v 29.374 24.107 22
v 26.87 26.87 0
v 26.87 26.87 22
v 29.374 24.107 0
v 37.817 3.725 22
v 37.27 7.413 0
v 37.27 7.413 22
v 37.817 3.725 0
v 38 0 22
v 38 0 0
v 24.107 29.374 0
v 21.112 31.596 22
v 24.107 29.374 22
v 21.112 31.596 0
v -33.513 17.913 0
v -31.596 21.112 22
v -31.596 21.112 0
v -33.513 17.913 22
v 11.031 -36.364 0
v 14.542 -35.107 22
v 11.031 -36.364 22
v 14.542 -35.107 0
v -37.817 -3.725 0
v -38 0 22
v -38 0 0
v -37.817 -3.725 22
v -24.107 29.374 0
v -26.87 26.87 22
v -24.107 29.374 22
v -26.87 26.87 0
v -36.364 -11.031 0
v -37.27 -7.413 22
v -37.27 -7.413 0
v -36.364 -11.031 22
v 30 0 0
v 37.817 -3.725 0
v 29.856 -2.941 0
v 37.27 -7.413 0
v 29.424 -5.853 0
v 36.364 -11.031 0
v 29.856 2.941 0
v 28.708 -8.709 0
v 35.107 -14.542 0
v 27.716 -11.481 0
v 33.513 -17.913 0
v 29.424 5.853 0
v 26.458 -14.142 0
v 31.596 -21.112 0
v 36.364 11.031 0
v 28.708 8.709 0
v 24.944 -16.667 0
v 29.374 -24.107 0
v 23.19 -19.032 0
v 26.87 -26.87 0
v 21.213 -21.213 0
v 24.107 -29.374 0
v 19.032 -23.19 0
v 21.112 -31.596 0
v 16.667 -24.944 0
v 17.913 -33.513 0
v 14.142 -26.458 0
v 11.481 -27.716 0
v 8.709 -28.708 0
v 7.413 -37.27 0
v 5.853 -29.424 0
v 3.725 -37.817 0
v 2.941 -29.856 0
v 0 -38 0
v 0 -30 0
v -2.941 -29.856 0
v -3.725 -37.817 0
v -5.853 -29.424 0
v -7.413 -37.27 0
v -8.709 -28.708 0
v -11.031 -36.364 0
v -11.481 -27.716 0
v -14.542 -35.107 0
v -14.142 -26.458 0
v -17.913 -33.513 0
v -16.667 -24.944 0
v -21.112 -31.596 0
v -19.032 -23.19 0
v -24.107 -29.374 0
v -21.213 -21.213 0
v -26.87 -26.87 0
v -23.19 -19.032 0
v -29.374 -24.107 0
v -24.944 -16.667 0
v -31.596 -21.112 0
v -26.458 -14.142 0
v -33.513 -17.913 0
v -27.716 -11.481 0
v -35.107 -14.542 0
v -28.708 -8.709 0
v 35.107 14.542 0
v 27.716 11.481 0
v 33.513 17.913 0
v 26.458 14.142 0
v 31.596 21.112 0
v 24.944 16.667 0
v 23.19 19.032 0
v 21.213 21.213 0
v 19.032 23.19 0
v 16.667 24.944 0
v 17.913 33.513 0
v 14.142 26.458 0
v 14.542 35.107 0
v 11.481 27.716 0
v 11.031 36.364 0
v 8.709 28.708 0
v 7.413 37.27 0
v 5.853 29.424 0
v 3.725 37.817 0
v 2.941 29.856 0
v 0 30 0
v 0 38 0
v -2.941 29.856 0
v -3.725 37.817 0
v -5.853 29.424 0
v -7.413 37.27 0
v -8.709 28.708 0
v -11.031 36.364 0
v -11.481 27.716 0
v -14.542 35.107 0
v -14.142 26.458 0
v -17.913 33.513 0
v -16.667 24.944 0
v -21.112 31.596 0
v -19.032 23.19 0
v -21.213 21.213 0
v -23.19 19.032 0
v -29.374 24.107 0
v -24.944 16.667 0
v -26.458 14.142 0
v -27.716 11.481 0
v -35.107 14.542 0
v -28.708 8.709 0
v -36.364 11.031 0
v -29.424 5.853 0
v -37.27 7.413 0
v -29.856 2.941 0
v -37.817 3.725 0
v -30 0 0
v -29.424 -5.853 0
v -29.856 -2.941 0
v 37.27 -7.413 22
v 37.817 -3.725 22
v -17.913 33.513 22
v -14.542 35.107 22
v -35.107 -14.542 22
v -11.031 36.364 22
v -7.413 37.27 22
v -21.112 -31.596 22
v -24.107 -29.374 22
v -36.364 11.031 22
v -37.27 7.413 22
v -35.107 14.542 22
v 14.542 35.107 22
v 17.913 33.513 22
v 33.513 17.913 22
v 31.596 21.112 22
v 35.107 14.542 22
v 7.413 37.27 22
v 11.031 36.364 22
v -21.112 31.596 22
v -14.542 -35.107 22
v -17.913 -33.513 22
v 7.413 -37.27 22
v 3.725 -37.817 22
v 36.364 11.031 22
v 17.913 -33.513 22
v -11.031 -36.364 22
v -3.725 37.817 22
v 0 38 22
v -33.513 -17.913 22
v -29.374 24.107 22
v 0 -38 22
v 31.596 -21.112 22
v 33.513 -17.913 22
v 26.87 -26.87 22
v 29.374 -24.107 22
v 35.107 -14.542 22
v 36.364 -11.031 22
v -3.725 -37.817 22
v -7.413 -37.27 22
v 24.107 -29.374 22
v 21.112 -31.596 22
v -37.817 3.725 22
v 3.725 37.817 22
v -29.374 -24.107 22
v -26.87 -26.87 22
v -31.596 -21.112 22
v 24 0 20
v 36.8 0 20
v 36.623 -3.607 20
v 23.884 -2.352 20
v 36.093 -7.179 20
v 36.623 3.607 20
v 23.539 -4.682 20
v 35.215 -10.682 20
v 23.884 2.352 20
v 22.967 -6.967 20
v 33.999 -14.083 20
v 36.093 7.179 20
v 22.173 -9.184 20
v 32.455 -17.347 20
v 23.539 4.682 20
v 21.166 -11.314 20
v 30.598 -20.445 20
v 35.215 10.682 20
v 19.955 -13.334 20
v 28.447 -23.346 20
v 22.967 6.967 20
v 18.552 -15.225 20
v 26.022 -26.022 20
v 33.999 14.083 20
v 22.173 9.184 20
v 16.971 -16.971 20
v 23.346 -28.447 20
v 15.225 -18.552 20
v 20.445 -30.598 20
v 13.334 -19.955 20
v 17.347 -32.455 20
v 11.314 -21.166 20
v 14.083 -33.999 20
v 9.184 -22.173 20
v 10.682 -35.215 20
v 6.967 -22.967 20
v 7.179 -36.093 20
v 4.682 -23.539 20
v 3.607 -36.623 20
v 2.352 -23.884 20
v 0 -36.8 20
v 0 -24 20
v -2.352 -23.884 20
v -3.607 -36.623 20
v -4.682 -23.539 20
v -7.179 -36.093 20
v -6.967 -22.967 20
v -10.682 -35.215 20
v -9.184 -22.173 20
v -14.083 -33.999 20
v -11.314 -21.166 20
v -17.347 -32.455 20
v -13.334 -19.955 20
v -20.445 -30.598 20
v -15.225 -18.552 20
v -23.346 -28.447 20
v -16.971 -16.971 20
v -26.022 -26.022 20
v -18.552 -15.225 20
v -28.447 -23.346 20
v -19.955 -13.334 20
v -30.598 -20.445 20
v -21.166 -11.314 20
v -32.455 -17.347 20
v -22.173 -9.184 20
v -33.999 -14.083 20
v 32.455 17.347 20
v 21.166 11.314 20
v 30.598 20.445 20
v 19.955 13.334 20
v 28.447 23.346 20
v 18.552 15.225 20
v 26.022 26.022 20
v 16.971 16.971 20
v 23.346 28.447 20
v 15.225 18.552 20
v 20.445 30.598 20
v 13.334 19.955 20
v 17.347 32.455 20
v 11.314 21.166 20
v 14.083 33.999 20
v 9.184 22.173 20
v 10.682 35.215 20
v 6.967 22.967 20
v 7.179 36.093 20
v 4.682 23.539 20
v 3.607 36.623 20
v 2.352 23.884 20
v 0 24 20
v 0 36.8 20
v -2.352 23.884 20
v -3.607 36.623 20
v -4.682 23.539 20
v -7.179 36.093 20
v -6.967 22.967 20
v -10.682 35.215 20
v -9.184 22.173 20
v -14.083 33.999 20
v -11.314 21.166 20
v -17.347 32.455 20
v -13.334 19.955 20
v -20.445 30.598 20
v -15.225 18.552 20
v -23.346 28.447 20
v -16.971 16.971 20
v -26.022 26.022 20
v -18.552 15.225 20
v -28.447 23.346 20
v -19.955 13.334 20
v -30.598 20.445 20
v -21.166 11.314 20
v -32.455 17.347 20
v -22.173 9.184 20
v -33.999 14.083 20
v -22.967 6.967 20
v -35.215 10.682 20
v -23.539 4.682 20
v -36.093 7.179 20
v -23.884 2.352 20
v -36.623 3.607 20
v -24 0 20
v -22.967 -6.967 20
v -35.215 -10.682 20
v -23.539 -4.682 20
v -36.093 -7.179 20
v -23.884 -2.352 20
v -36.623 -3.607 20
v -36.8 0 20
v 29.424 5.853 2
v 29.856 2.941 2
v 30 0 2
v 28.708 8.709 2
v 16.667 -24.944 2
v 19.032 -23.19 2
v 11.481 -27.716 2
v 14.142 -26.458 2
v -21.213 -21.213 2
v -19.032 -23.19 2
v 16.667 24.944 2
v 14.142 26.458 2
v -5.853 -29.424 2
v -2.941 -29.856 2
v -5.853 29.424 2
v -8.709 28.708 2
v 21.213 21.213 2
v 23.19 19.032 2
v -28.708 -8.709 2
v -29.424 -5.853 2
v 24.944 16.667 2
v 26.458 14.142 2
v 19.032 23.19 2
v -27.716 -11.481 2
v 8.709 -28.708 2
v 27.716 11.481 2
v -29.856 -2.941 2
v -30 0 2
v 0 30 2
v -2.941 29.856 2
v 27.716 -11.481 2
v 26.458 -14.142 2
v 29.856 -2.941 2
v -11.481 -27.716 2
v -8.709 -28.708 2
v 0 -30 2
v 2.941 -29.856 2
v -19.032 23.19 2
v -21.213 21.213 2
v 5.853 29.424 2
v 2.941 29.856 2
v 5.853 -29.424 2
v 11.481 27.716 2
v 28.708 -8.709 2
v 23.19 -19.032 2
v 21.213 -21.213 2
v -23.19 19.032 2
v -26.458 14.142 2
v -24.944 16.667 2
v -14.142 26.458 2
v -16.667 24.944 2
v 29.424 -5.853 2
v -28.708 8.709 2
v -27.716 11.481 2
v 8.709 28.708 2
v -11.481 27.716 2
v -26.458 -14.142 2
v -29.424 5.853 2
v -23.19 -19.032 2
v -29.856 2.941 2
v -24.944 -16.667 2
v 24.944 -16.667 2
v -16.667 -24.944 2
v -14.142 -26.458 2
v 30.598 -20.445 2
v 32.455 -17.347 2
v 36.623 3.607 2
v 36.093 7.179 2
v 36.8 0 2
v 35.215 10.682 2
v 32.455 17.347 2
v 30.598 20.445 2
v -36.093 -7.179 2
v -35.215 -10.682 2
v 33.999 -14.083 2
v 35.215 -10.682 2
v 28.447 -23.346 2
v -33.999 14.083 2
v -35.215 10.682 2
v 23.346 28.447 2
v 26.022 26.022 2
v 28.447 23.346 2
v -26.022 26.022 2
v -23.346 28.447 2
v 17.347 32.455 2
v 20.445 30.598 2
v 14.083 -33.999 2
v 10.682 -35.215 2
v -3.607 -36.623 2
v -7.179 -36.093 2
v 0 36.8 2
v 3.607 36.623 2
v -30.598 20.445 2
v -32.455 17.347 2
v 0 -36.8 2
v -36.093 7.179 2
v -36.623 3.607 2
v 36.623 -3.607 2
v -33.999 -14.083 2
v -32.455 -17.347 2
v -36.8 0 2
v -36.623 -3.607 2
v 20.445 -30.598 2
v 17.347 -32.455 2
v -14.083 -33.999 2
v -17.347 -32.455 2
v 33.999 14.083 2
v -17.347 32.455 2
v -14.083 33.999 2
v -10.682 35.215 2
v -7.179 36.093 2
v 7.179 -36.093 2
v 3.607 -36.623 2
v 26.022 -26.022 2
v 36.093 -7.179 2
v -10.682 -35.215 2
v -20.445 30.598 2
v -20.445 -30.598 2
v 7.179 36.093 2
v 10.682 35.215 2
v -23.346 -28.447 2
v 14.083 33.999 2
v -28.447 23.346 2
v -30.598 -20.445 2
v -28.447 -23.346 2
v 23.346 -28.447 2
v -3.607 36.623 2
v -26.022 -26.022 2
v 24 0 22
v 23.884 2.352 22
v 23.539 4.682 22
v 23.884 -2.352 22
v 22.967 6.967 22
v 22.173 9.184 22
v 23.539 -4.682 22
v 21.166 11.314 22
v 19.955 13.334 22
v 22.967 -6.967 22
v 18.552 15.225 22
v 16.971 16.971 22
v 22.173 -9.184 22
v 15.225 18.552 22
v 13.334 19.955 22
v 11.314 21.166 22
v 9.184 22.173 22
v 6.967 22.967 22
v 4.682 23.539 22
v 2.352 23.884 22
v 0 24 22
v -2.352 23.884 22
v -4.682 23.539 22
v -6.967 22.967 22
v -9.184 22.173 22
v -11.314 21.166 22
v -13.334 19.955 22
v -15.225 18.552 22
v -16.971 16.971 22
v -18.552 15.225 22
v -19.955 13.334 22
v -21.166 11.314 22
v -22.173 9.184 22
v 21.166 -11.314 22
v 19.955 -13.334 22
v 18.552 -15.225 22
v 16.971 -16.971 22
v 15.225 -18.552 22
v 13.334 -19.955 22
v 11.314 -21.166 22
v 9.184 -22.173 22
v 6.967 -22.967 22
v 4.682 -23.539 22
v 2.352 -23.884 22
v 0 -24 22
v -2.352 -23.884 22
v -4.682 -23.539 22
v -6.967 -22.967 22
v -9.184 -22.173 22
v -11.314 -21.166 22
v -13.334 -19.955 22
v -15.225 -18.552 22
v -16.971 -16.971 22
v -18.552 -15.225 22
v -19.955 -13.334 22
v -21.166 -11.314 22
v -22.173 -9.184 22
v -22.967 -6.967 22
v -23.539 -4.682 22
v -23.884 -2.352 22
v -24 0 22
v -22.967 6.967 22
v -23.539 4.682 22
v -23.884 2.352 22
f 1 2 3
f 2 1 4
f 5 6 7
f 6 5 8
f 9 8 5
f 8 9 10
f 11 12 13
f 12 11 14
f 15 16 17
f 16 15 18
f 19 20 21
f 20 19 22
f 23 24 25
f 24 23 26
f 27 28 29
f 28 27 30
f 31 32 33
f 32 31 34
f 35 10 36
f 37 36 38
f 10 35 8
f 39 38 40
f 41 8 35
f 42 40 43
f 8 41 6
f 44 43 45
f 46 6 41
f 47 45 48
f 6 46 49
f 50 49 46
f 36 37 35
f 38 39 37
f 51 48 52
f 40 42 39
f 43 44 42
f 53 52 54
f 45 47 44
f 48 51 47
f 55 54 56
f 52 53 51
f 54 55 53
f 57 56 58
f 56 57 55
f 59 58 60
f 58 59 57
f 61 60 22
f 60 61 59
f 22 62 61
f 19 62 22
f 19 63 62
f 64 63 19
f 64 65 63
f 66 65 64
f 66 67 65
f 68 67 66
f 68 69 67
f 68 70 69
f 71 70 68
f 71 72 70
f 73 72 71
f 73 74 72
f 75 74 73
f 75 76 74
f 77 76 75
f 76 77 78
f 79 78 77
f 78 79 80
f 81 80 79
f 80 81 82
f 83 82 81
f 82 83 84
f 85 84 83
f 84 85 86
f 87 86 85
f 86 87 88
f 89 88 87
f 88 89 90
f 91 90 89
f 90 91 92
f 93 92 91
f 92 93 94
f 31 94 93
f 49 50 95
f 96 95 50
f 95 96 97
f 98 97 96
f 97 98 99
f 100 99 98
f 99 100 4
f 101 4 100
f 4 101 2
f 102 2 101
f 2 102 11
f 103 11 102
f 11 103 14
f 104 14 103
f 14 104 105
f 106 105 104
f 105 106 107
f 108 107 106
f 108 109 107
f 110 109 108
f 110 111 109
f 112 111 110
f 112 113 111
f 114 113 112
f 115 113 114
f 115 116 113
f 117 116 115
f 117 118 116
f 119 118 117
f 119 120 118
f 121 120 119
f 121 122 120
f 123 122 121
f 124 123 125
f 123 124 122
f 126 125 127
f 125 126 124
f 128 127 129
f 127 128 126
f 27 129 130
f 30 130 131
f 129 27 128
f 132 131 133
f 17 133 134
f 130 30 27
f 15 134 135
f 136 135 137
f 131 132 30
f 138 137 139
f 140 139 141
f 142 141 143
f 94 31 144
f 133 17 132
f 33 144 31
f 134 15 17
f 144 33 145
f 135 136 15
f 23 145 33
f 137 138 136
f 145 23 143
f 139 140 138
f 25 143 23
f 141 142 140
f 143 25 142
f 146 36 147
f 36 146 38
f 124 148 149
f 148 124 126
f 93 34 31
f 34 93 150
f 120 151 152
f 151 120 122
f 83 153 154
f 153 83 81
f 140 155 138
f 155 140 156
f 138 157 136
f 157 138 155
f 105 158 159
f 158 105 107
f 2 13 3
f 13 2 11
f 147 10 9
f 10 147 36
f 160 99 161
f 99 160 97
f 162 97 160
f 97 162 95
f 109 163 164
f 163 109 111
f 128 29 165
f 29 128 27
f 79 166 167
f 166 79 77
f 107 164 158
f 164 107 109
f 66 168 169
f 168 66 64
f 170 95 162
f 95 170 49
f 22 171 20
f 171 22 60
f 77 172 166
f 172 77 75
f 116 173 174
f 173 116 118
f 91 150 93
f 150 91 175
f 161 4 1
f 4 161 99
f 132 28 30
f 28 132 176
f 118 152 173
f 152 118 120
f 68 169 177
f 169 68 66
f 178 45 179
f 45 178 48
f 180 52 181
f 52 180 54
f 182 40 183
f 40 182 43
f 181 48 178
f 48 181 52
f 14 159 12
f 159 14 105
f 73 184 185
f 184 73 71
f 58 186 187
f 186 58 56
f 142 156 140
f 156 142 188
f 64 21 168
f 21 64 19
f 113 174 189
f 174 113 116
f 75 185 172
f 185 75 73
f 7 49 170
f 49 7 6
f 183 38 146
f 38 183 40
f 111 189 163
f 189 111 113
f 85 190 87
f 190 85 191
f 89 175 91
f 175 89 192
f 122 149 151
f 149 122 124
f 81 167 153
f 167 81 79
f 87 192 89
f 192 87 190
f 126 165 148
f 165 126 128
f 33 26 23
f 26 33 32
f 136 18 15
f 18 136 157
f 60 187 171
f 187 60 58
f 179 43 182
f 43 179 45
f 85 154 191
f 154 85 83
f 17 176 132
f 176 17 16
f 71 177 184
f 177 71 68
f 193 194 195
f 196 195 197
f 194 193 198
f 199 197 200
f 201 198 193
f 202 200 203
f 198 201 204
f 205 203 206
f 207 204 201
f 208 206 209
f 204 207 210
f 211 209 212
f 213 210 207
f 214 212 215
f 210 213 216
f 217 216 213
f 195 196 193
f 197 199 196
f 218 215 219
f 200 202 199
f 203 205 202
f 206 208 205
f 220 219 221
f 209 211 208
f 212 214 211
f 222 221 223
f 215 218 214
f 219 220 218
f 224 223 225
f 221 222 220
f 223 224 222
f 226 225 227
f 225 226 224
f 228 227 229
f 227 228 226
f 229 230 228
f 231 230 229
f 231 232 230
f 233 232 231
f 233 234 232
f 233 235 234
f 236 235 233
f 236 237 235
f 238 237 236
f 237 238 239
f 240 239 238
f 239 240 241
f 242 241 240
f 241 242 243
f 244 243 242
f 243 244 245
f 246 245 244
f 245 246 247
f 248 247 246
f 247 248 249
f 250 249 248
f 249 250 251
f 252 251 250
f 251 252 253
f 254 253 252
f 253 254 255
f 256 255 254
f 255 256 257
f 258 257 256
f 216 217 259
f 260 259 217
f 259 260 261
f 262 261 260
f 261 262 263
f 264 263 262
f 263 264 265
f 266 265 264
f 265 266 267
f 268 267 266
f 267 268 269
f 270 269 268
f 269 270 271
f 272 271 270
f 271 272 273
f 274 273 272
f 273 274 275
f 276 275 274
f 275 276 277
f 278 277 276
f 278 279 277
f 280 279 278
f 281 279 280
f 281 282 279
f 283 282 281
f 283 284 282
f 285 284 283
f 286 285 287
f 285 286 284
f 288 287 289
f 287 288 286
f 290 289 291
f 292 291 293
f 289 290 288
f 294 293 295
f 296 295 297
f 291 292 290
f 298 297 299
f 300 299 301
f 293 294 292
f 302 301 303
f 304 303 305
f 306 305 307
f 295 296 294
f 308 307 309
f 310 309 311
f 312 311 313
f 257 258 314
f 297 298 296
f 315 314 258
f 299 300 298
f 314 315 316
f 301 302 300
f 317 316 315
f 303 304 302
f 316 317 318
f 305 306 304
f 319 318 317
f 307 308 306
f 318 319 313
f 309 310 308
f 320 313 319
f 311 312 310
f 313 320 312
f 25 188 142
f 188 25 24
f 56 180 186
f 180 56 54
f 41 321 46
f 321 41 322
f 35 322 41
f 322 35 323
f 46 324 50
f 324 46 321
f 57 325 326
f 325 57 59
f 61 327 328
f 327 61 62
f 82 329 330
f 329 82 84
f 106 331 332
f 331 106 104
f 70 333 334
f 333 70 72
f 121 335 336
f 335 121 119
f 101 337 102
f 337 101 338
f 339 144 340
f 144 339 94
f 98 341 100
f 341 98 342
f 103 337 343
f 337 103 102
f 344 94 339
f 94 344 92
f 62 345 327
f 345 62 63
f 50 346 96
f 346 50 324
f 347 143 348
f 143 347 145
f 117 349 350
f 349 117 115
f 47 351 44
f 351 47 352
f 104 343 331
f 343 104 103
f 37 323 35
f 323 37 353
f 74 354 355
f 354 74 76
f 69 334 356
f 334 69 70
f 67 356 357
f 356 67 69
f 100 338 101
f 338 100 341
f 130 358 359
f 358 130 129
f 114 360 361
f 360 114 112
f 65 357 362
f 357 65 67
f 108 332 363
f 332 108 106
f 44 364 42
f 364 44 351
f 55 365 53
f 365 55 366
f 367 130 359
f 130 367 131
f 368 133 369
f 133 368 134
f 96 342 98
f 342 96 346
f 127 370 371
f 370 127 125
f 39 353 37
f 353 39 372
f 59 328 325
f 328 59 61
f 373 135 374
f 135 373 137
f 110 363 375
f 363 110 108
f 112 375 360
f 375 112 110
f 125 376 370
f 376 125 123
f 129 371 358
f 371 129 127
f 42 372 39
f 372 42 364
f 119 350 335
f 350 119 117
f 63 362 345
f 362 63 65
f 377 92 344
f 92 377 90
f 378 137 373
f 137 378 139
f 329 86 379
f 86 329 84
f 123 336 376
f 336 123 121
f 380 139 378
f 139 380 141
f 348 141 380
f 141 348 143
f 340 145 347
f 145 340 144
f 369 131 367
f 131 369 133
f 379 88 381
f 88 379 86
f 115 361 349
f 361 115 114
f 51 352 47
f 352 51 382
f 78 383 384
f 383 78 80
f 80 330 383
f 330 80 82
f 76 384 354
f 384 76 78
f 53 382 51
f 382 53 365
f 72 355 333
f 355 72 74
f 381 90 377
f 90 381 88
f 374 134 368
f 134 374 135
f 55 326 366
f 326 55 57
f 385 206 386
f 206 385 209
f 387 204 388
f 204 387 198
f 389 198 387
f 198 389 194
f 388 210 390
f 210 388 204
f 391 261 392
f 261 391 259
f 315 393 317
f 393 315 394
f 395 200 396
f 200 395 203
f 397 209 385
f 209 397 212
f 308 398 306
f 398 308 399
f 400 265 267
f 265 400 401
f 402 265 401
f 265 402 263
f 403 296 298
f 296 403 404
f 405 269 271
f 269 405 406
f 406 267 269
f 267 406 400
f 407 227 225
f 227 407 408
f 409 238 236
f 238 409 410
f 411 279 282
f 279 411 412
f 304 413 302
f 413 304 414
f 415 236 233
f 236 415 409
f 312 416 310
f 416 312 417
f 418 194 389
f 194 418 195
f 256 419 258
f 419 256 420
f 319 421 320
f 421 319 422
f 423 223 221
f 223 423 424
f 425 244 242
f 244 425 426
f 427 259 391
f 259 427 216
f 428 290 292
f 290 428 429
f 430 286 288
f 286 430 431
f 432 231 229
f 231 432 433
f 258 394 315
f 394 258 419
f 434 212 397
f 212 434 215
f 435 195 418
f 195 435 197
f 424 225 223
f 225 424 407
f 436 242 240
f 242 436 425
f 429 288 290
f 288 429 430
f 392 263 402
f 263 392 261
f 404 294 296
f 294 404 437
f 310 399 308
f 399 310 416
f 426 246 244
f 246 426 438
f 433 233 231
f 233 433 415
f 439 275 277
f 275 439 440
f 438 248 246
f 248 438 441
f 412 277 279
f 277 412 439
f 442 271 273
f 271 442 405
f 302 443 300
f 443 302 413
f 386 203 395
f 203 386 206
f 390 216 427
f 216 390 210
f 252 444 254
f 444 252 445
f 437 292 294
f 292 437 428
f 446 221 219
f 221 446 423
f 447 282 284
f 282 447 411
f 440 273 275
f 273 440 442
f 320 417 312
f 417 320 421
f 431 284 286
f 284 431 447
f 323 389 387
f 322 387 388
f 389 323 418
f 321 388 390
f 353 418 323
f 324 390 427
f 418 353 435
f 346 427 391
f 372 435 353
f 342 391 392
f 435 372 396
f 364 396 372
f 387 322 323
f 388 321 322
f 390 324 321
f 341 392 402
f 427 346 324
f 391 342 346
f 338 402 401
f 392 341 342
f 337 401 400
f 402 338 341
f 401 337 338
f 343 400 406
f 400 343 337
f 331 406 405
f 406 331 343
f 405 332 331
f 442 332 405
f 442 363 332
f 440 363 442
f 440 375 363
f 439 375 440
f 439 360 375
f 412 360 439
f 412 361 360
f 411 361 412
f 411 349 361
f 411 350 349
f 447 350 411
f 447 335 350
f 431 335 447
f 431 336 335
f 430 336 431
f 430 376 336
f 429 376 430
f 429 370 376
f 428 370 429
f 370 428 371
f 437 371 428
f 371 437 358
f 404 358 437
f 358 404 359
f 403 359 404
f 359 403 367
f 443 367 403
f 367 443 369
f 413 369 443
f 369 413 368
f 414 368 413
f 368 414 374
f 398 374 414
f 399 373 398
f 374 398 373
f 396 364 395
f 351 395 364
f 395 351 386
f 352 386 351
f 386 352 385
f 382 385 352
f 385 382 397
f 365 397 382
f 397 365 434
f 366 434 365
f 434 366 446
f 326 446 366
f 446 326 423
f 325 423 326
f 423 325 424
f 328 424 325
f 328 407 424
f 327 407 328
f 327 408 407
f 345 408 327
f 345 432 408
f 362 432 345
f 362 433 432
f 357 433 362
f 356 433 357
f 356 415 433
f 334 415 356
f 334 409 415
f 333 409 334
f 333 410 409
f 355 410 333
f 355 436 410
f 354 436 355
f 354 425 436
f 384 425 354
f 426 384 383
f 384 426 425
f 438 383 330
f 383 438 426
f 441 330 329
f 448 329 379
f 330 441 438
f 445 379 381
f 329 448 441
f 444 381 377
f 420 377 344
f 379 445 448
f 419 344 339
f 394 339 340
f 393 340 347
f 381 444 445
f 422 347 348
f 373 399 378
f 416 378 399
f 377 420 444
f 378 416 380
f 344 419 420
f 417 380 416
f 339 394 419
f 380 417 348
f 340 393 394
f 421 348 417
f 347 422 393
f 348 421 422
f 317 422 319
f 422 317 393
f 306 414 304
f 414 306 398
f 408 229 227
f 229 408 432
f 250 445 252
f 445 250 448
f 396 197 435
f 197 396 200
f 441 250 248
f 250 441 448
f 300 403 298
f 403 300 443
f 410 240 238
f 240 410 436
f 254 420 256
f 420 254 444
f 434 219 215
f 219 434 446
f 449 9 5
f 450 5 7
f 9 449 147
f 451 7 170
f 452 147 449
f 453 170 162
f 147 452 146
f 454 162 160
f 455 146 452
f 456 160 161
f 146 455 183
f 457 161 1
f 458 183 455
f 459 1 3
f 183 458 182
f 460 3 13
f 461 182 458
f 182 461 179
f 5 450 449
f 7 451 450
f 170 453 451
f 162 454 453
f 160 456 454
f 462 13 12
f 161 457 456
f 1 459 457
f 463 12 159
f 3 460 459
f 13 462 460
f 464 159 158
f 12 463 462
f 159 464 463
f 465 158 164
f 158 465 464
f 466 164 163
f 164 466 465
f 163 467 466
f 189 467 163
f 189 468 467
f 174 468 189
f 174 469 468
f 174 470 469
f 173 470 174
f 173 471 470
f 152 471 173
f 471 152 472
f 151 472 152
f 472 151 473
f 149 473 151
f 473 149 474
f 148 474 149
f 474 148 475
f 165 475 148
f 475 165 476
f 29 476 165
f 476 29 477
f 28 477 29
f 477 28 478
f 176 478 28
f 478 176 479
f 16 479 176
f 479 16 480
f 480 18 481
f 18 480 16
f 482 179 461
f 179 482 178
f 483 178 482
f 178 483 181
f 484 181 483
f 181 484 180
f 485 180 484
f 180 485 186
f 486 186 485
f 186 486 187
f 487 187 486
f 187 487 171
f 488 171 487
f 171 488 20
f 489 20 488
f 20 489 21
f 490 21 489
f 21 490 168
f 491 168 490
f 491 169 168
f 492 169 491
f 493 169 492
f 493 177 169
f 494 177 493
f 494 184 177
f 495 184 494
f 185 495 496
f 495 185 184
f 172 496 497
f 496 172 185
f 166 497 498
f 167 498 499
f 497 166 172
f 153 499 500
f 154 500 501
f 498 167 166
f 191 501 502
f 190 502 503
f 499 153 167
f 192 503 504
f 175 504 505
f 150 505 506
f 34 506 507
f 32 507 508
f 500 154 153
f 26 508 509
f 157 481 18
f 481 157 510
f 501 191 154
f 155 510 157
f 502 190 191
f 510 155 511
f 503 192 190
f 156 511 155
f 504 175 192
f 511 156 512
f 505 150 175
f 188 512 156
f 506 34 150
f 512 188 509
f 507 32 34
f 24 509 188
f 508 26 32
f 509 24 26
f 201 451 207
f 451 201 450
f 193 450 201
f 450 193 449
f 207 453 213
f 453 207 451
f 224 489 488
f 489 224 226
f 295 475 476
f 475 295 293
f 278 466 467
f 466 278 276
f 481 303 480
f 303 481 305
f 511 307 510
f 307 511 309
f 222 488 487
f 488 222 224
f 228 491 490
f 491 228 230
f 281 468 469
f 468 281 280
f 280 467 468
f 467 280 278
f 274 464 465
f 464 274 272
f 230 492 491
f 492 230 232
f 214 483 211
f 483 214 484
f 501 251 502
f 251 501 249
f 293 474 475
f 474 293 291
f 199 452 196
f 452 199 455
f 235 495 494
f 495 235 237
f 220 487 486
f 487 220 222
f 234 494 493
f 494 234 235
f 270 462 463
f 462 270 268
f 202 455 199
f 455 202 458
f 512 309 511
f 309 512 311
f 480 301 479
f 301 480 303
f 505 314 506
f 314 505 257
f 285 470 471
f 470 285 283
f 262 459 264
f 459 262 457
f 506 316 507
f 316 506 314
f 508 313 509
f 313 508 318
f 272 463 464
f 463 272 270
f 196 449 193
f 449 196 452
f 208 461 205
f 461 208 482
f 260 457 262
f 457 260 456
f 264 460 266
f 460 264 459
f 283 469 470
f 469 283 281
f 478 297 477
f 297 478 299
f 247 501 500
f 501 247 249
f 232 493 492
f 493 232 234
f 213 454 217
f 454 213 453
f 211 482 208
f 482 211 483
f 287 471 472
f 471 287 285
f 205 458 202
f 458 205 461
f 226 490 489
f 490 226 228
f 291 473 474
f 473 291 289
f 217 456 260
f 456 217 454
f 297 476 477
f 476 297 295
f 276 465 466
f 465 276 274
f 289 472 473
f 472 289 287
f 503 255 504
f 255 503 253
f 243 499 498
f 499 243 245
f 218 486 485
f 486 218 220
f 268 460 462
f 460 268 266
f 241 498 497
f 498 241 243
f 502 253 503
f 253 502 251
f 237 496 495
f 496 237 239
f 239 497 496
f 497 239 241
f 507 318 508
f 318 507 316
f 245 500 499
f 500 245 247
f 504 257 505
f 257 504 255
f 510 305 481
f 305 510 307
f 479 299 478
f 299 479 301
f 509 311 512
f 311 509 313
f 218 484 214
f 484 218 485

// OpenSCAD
$fn=64;
// h=120;
h=20 ;

difference() {
  cylinder(r=38,h=h);
  translate([0,0,-0.1]) cylinder(r=30,h=2.2);
  translate([0,0,2]) cylinder(r=38-1.2,h=120);
}

translate([0,0,20]) difference() {
  cylinder(r=38,h=2);
  translate([0,0,-0.1]) cylinder(r=24,h=2.2);
}
